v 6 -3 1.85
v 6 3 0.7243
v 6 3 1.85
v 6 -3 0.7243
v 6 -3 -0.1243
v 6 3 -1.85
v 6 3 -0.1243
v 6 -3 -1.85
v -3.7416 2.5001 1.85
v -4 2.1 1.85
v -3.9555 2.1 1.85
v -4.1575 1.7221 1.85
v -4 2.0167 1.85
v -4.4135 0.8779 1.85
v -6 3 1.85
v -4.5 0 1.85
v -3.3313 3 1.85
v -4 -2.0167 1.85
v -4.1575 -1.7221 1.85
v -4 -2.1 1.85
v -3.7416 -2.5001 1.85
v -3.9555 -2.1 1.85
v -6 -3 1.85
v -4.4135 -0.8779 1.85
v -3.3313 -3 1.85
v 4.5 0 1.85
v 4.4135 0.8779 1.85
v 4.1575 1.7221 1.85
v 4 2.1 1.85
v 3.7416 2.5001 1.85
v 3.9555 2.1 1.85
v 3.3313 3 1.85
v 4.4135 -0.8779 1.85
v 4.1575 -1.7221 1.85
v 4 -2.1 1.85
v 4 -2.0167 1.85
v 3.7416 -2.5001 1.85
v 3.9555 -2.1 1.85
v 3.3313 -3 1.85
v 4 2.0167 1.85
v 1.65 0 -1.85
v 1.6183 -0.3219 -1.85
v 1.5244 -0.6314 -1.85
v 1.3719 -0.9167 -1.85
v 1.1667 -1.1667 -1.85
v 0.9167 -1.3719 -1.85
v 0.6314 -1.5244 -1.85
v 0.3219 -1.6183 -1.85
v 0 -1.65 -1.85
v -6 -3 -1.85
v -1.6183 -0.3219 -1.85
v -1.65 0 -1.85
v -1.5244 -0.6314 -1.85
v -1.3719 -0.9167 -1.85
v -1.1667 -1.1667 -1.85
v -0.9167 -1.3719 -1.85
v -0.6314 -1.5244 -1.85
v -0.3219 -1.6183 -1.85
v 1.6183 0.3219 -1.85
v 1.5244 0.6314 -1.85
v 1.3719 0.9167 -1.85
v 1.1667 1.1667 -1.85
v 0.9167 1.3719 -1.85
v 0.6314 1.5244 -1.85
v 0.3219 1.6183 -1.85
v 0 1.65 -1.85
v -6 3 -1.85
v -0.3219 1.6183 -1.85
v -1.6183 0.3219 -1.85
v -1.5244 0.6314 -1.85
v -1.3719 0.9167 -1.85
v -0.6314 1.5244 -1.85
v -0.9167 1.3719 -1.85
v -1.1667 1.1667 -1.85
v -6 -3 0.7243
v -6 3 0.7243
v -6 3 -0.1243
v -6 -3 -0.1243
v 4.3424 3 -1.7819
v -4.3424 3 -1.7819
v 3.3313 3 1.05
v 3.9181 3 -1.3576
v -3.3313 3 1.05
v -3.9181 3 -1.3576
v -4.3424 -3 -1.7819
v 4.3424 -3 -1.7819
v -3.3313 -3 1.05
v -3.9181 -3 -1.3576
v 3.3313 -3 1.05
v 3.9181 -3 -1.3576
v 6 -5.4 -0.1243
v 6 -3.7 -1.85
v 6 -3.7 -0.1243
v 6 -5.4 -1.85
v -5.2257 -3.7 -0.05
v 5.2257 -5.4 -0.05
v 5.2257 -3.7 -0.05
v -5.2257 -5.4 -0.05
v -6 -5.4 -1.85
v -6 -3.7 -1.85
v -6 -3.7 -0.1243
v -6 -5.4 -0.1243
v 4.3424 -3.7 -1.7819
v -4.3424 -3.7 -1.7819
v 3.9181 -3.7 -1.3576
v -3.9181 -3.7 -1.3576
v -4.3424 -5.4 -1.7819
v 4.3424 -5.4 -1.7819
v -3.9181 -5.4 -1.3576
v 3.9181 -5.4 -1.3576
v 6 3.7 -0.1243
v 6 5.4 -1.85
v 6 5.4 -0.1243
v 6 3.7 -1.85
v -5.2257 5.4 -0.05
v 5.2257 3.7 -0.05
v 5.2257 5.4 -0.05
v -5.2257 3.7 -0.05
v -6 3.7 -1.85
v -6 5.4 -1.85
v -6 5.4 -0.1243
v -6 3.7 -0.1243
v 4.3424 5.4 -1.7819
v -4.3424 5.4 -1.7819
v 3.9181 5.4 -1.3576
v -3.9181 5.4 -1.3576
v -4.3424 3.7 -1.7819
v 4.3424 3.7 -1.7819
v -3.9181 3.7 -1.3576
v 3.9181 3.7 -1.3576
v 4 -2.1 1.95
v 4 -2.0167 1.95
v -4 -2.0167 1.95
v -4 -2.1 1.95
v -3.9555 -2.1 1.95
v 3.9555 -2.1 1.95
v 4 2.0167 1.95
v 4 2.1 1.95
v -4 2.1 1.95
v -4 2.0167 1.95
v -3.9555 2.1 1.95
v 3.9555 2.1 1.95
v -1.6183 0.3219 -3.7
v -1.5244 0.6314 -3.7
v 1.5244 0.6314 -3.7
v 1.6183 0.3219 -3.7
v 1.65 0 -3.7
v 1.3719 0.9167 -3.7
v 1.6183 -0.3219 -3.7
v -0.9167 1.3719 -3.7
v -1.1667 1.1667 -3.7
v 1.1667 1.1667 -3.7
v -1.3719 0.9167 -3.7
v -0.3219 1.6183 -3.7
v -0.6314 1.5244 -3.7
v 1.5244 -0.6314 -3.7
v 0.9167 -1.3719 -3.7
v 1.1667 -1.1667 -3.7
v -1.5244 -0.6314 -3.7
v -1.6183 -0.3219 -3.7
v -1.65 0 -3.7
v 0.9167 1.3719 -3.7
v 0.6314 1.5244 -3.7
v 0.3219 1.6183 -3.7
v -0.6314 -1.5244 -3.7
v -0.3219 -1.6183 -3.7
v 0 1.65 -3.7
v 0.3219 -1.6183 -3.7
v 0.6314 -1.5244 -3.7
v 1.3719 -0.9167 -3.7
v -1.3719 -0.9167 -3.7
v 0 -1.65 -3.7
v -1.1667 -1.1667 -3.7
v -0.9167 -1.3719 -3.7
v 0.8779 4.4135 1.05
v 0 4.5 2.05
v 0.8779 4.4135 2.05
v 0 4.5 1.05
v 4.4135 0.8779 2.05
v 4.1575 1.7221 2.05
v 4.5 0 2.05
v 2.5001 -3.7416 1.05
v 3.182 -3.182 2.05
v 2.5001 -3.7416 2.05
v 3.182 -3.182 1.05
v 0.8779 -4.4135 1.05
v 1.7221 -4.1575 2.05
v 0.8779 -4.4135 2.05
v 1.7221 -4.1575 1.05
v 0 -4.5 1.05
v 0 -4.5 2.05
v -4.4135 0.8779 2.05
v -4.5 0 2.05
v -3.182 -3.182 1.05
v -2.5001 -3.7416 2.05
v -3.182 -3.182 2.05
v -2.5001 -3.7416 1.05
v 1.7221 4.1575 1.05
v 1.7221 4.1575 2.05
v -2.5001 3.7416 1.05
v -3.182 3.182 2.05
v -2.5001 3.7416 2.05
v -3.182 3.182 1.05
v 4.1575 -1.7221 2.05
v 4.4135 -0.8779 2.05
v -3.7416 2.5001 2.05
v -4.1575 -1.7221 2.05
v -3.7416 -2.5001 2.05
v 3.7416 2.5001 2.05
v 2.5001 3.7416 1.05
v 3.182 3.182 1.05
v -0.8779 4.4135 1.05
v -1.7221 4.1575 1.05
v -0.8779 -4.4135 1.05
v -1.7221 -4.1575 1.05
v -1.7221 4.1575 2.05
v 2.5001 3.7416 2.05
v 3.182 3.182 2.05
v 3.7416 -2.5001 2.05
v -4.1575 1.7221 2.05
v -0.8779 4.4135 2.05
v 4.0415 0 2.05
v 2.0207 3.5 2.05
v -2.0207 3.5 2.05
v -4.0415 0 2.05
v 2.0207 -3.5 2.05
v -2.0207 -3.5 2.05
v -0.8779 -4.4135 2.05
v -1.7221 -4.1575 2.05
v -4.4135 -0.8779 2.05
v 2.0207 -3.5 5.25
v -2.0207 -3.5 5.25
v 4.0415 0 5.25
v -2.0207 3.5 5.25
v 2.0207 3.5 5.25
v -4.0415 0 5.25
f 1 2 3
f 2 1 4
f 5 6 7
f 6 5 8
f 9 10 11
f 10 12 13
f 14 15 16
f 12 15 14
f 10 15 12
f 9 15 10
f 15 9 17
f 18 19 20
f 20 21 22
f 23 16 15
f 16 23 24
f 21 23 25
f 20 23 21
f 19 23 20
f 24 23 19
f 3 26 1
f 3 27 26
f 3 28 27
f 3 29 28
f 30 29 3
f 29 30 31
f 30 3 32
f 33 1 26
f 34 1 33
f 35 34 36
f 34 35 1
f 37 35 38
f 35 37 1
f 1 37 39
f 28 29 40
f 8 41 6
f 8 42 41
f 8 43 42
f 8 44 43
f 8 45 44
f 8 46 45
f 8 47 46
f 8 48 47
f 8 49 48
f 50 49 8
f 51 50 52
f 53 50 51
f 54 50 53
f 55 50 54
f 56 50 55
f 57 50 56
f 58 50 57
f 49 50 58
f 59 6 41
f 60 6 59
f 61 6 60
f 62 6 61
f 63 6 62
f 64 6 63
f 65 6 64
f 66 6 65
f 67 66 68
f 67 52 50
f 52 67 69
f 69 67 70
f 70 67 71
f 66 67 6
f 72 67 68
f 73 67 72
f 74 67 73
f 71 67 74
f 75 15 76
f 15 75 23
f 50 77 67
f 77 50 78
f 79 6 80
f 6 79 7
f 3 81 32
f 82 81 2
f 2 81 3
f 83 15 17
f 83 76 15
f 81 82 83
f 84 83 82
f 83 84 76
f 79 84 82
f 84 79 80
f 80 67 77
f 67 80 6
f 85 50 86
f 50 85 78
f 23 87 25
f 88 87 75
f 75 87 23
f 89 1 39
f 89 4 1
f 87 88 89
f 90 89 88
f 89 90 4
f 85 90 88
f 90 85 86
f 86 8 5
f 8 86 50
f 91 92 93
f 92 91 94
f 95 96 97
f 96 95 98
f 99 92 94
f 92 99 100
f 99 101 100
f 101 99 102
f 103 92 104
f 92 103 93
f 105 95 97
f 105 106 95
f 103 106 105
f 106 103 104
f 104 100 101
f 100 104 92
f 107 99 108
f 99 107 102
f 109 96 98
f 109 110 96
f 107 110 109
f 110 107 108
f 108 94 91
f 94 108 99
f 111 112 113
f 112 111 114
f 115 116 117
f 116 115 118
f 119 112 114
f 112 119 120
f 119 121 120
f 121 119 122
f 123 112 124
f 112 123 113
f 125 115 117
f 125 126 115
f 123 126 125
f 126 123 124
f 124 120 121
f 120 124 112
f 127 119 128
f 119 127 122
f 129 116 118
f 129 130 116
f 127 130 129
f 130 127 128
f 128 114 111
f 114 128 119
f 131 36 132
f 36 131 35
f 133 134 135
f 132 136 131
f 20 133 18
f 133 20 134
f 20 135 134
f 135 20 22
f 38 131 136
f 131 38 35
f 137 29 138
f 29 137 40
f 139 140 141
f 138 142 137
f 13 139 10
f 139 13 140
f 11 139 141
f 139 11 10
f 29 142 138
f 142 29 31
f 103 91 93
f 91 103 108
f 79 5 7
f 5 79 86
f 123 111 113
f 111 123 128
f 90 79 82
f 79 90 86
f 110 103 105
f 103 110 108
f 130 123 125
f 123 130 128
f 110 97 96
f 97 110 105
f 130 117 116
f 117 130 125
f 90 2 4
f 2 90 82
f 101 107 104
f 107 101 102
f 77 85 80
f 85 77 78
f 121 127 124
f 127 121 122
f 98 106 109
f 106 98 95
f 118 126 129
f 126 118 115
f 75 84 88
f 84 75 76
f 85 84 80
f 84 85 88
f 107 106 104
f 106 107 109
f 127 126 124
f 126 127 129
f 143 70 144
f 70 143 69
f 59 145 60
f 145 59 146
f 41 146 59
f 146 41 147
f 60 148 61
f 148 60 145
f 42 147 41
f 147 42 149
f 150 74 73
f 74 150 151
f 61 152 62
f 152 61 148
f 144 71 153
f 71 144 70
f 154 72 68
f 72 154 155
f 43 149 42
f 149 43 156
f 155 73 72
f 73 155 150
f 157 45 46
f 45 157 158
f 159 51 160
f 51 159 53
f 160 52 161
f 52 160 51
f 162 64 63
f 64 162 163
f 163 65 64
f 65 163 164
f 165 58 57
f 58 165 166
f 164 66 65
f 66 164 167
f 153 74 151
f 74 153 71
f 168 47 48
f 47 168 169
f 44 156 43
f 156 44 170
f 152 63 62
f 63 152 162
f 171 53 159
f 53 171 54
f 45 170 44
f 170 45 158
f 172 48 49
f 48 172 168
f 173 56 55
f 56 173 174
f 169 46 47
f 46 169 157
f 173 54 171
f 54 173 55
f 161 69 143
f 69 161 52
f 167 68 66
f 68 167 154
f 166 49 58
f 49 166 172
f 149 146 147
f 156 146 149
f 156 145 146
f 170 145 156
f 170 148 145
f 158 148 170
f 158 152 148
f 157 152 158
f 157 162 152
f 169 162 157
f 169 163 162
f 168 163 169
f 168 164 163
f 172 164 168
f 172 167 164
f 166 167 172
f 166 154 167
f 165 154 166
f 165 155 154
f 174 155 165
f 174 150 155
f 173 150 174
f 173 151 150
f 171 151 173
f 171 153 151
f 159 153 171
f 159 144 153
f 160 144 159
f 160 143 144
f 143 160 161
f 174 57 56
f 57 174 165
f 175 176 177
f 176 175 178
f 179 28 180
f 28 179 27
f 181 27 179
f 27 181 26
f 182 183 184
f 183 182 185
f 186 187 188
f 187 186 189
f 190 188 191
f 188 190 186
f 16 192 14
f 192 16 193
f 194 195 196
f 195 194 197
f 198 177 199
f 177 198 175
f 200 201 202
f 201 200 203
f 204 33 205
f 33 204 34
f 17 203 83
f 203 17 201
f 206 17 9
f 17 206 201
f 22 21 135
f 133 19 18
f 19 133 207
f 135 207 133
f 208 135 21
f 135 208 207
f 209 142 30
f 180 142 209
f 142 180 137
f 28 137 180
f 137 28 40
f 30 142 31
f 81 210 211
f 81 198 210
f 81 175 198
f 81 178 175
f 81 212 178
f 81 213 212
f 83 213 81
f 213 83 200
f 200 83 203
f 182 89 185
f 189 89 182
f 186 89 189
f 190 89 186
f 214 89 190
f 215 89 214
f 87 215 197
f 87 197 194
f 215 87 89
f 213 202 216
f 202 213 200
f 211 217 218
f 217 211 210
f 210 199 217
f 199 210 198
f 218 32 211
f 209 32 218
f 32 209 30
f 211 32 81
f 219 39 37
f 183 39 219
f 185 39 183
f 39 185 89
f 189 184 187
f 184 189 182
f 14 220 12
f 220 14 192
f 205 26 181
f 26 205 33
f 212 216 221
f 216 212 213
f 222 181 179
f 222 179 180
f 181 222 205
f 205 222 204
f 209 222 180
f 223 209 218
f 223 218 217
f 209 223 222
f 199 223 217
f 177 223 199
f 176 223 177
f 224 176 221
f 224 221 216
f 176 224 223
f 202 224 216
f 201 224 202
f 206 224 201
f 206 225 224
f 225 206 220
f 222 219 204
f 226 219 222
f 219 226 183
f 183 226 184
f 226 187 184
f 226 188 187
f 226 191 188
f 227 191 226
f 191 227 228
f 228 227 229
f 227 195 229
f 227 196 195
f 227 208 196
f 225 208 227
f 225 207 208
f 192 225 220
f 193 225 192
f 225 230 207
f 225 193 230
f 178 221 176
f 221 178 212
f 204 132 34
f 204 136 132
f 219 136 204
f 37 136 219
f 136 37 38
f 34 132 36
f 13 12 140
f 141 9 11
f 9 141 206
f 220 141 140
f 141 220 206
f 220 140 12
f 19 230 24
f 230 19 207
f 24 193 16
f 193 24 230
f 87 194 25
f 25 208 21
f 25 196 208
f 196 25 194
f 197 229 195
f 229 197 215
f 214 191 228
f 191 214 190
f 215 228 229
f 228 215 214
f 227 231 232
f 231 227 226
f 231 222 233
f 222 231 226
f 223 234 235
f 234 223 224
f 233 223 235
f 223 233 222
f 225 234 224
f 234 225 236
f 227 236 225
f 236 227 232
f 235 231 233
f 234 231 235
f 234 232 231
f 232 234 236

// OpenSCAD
// Parameters
screw_thread_diameter_mm = 4.0; //[2.0:8.0:0.1]
thread_pitch_mm = 0.7; //[0.35:1.4:0.05]
across_flats_mm = 6.0; //[3.0:12.0:0.1]
thickness_mm = 3.7; //[1.85:7.4:0.1]
overall_length_mm = 12.0; //[6.0:24.0:0.5]
overall_width_mm = 10.0; //[5.0:20.0:0.5]
slot_internal_width_mm = 8.2; //[6.0:12.0:0.1]
slot_width_mm = 6.2; //[4.0:10.0:0.1]
slot_lip_thickness_mm = 1.8; //[0.9:3.6:0.1]
slot_depth_mm = 6.0; //[3.0:12.0:0.5]
edge_chamfer_mm = 0.3; //[0.15:0.6:0.05]
corner_radius_mm = 0.2; //[0.1:0.6:0.05]
thread_hole_diameter_mm = 3.3; //[2.5:4.2:0.05]
hole_clearance_diameter_mm = 4.3; //[4.0:5.0:0.05]
wing_overlap_mm = 0.8; //[0.4:1.6:0.1]
anti_rotation_rib_depth_mm = 0.6; //[0.3:1.2:0.05]
anti_rotation_rib_width_mm = 1.2; //[0.6:2.4:0.1]
anti_rotation_rib_length_mm = 8.0; //[4.0:16.0:0.5]
include_nut_and_washer = 1; //[0:1:1]
ref_washer_od_mm = 9.0; //[6.0:18.0:0.5]
ref_washer_thickness_mm = 1.0; //[0.5:2.0:0.1]
ref_nut_thickness_mm = 3.2; //[1.6:6.4:0.1]
ref_nut_across_flats_mm = 7.0; //[3.5:14.0:0.1]
ref_stack_overlap_mm = 0.8; //[0.4:1.6:0.1]

// Nut and Washer - complete geometry
module nut_and_washer() {
  color("Silver") {
    // Washer
    translate([0, 0, thickness_mm/2 + ref_washer_thickness_mm/2 - ref_stack_overlap_mm])
      cylinder(r=ref_washer_od_mm/2, h=ref_washer_thickness_mm, center=true, $fn=32);
    // Nut
    translate([0, 0, thickness_mm/2 + ref_washer_thickness_mm + ref_nut_thickness_mm/2 - ref_stack_overlap_mm])
      cylinder(r=(ref_nut_across_flats_mm/2)/cos(30), h=ref_nut_thickness_mm, center=true, $fn=6);
  }
}

// T-slot nut body with wings and ribs
module t_slot_nut() {
  color("DimGray") {
    // Main body
    difference() {
      union() {
        // Nut body
        translate([0, 0, 0])
          cube([overall_length_mm, across_flats_mm, thickness_mm], center=true);
        // Wings
        translate([0, -(slot_internal_width_mm/2 + ((overall_width_mm - slot_internal_width_mm)/2 + wing_overlap_mm)/2 - wing_overlap_mm/2), -(thickness_mm/2 - min(thickness_mm, slot_lip_thickness_mm)/2)])
          cube([overall_length_mm, (overall_width_mm - slot_internal_width_mm)/2 + wing_overlap_mm, min(thickness_mm, slot_lip_thickness_mm)], center=true);
        translate([0, (slot_internal_width_mm/2 + ((overall_width_mm - slot_internal_width_mm)/2 + wing_overlap_mm)/2 - wing_overlap_mm/2), -(thickness_mm/2 - min(thickness_mm, slot_lip_thickness_mm)/2)])
          cube([overall_length_mm, (overall_width_mm - slot_internal_width_mm)/2 + wing_overlap_mm, min(thickness_mm, slot_lip_thickness_mm)], center=true);
        // Anti-rotation ribs
        translate([0, -(across_flats_mm/4), (thickness_mm/2 + anti_rotation_rib_depth_mm/2 - 0.5)])
          cube([anti_rotation_rib_length_mm, anti_rotation_rib_width_mm, anti_rotation_rib_depth_mm], center=true);
        translate([0, (across_flats_mm/4), (thickness_mm/2 + anti_rotation_rib_depth_mm/2 - 0.5)])
          cube([anti_rotation_rib_length_mm, anti_rotation_rib_width_mm, anti_rotation_rib_depth_mm], center=true);
      }
      // Lead-in chamfers
      translate([(overall_length_mm/2 - edge_chamfer_mm), 0, 0])
        rotate([0, 45, 0])
        cube([edge_chamfer_mm*2, overall_width_mm*1.2, thickness_mm*1.2], center=true);
      translate([-(overall_length_mm/2 - edge_chamfer_mm), 0, 0])
        rotate([0, -45, 0])
        cube([edge_chamfer_mm*2, overall_width_mm*1.2, thickness_mm*1.2], center=true);
    }
    // Hex profile
    intersection() {
      cube([overall_length_mm, across_flats_mm, thickness_mm], center=true);
      cylinder(r=(across_flats_mm/2)/cos(30), h=thickness_mm, center=true, $fn=6);
    }
    // Threaded hole
    translate([0, 0, 0])
      cylinder(r=thread_hole_diameter_mm/2, h=thickness_mm*2, center=true, $fn=32);
  }
}

// Assembly
module assembly() {
  t_slot_nut();
  if (include_nut_and_washer) {
    nut_and_washer();
  }
}

assembly();
